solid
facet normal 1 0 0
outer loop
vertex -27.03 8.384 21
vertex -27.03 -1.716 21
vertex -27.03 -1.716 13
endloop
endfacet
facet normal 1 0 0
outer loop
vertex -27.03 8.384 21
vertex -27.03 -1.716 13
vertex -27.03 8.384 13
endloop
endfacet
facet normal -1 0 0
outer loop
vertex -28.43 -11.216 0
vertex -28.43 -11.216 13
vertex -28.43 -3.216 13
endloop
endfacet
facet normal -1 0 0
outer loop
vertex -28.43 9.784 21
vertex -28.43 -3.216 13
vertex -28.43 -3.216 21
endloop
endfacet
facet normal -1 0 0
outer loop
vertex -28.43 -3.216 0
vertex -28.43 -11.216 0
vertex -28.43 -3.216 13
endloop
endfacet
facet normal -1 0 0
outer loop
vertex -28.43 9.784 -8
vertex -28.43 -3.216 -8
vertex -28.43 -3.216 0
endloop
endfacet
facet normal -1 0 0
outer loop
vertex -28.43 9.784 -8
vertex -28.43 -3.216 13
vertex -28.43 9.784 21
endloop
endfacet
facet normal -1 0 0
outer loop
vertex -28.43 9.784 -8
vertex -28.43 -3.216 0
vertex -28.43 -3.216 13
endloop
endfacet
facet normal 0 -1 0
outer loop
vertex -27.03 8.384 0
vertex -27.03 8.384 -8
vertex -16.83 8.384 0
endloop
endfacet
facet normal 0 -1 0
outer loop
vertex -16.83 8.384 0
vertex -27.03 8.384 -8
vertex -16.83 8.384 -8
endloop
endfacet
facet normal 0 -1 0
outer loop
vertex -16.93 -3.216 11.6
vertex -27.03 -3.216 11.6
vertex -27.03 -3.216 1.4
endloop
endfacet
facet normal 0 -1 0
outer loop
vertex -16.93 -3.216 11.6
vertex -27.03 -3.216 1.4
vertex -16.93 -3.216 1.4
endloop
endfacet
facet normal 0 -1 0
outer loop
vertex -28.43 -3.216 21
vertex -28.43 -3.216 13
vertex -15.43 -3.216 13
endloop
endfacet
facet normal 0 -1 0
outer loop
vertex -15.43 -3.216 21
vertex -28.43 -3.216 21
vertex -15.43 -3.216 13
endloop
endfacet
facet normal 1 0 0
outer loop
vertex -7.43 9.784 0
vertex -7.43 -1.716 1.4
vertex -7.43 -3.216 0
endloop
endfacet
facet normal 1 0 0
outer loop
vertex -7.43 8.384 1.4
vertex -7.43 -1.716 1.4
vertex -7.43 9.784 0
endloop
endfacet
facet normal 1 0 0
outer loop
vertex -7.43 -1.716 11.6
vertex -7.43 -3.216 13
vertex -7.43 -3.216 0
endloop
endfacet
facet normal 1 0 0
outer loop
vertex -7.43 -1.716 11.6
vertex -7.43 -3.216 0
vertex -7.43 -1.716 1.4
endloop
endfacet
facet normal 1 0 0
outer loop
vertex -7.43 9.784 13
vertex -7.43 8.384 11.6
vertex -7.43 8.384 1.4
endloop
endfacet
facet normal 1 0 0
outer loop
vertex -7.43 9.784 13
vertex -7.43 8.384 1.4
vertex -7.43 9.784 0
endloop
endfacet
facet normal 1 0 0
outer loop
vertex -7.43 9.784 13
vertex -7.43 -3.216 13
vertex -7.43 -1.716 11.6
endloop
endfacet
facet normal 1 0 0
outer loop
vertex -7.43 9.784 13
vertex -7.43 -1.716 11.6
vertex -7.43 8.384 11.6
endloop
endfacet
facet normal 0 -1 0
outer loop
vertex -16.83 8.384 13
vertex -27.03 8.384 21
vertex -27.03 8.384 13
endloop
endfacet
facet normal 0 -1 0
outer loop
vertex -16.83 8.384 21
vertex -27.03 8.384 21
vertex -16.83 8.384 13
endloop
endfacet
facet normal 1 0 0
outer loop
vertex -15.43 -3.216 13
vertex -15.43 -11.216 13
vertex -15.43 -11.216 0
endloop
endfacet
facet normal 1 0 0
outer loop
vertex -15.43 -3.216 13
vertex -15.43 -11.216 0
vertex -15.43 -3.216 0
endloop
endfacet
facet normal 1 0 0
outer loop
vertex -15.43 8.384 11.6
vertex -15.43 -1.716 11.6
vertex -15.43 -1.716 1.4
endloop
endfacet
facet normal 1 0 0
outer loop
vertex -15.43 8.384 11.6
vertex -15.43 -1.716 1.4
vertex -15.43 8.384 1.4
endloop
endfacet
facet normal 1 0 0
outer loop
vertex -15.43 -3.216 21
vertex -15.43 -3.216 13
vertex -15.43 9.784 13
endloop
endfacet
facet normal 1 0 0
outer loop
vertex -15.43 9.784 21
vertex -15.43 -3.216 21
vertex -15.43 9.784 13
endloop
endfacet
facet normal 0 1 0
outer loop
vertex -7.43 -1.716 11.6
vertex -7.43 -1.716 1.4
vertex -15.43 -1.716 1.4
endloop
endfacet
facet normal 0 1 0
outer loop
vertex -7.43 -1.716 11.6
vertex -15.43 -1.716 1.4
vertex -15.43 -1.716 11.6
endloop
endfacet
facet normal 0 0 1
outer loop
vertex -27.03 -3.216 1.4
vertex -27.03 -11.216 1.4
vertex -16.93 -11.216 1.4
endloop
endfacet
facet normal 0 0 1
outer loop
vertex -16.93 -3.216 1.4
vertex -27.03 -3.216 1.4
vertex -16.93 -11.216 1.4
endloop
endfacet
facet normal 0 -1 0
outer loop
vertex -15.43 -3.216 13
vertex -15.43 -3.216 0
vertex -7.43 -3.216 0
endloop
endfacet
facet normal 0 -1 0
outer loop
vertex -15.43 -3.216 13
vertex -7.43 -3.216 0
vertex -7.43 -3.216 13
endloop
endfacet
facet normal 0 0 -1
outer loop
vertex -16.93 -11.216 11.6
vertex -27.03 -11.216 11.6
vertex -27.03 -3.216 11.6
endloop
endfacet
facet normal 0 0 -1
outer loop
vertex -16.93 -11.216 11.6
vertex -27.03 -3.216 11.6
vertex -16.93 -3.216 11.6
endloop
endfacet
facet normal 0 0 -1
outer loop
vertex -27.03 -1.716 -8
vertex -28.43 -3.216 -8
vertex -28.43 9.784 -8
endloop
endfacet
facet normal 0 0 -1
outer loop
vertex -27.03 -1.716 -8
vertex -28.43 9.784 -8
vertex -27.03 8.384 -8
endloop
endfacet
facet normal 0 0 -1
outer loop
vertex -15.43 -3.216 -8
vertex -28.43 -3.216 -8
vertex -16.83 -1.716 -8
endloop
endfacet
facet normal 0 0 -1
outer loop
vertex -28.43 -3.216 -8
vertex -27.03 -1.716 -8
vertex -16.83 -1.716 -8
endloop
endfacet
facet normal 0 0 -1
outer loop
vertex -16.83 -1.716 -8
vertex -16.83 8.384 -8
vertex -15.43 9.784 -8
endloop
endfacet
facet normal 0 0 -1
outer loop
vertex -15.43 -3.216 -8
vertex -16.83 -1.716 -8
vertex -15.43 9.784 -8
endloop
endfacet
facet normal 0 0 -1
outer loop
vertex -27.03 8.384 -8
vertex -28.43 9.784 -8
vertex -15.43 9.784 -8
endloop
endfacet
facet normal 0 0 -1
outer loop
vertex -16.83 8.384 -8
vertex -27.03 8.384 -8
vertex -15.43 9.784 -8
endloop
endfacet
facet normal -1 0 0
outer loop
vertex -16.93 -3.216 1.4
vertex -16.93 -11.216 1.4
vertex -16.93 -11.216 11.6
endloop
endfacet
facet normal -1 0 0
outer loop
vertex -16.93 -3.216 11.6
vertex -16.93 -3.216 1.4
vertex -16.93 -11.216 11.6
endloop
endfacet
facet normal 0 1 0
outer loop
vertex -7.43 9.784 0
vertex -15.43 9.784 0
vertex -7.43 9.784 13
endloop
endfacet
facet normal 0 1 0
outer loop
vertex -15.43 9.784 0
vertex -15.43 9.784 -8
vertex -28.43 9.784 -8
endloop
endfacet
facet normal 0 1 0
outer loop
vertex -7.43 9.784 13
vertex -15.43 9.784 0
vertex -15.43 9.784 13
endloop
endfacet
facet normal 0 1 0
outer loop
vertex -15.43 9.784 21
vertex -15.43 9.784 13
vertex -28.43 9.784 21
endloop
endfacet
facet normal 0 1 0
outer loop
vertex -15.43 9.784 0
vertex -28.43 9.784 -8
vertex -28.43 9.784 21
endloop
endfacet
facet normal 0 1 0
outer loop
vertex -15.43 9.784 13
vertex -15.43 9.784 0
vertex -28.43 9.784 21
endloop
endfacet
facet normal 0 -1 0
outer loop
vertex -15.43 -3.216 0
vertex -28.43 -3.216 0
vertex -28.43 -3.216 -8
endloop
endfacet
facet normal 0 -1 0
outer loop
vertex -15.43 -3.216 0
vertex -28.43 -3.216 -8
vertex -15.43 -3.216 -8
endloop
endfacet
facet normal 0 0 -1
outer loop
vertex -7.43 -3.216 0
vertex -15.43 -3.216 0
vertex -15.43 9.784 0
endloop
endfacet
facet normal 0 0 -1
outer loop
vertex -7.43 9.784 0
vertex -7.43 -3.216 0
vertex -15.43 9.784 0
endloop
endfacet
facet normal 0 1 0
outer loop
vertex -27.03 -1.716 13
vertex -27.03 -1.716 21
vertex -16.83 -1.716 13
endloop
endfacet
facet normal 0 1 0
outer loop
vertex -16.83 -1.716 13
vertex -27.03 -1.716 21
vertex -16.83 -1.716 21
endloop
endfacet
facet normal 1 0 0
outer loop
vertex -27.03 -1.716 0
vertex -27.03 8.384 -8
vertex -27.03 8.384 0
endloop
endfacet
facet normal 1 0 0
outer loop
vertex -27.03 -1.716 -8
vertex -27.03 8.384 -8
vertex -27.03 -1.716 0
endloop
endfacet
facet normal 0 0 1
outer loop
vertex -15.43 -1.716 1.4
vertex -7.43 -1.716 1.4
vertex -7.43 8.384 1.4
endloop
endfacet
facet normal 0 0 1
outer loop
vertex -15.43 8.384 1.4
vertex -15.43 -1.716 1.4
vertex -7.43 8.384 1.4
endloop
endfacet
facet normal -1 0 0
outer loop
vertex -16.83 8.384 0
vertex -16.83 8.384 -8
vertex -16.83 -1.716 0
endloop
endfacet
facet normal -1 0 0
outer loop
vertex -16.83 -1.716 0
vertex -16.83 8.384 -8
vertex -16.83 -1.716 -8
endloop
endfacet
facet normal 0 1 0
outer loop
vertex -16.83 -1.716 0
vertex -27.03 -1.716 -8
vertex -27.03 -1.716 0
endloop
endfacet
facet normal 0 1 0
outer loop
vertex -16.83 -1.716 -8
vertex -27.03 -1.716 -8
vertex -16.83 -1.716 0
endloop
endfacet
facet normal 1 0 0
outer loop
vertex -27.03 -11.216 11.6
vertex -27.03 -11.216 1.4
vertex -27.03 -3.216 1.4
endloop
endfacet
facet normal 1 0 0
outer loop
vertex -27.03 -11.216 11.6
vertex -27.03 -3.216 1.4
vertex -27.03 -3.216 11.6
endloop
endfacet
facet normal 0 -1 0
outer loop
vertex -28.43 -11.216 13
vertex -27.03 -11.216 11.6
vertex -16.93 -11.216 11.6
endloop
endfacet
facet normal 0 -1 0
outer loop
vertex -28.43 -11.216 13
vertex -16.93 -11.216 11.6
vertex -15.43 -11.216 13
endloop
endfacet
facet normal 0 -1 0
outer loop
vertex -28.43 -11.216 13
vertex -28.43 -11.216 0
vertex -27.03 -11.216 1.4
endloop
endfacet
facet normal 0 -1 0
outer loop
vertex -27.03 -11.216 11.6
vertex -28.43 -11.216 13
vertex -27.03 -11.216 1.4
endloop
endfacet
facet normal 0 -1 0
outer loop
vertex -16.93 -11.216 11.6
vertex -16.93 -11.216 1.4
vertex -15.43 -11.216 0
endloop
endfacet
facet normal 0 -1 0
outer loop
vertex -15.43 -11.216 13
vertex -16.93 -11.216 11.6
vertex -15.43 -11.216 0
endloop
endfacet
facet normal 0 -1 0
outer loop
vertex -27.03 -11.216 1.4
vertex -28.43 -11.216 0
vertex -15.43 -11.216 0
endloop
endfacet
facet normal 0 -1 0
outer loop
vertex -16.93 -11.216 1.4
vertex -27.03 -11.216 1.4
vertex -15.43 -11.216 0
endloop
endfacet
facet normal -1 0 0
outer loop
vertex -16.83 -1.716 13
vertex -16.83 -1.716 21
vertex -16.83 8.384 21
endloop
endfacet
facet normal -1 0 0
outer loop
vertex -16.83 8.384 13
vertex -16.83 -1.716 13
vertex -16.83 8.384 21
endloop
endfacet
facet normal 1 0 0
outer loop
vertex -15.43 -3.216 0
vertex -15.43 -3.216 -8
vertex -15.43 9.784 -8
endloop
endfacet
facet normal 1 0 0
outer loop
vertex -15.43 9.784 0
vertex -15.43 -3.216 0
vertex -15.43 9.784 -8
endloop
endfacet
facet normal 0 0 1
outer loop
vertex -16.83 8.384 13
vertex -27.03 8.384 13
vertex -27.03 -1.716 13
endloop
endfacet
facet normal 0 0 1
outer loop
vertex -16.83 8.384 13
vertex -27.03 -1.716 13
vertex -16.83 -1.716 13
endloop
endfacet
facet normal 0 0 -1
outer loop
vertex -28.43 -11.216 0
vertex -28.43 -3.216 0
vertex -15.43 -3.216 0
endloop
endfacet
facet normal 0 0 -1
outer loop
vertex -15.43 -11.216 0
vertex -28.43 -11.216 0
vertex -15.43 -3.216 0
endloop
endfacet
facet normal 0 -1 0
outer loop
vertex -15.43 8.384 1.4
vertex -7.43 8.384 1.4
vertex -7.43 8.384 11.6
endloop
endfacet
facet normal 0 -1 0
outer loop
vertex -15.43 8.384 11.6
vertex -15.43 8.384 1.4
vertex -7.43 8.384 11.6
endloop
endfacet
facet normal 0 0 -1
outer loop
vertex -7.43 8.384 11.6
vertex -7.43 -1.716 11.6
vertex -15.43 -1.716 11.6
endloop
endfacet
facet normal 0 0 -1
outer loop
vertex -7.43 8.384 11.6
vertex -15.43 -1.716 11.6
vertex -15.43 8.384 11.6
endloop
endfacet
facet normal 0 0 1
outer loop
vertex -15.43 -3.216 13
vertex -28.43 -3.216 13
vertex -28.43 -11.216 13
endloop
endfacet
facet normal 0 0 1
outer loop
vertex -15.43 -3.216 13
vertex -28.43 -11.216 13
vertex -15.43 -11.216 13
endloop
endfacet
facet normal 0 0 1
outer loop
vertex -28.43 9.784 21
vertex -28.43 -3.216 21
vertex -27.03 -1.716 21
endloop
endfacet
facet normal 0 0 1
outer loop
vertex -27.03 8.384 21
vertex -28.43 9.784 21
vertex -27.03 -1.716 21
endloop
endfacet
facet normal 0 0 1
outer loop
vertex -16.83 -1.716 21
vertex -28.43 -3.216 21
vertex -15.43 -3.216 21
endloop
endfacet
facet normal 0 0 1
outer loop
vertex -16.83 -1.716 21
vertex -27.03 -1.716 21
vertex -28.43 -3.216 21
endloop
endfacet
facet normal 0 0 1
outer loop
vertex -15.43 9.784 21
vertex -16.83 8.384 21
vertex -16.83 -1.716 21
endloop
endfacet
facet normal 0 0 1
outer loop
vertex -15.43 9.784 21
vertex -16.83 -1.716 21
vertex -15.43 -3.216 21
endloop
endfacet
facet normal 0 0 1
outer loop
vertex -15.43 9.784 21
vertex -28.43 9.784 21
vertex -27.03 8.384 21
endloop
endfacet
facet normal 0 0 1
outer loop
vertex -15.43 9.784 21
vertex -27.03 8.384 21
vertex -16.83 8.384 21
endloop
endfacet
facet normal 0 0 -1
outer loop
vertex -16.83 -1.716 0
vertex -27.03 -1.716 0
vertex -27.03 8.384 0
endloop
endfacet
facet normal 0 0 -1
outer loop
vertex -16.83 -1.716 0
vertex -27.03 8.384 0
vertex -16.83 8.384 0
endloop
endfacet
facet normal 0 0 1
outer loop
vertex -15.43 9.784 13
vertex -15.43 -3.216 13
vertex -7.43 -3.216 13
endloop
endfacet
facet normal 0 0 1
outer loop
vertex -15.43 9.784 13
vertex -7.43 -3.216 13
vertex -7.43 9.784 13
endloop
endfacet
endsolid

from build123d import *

# Parameters (mm, degrees)
F0_W          = 13
F0_H          = 21
F1_DEPTH      = 13
F3_W          = 13
F3_H          = 13
F4_DEPTH      = 8
F4_DEPTH_BACK = 21
F5_W          = 10.2
F5_H          = 10.1
F6_DEPTH      = 8
F7_W          = 10.2
F7_H          = 10.1
F8_DEPTH      = 8
F9_W          = 13
F9_H          = 13
F10_DEPTH     = 8
F2_W          = 10.1
F2_H          = 10.2
F12_DEPTH     = 8
F11_W         = 10.1
F11_H         = 10.2
F13_DEPTH     = 8


with BuildPart() as f1:
    # F0 (on Top) → F1 (new body)
    with BuildSketch(Plane.XY):
        with Locations((-21.92968, -0.716216)):
            Rectangle(F0_W, F0_H)
    extrude(amount=F1_DEPTH)

    # F3 (on face) → F4 (join, two sides)
    with BuildSketch(Plane.XY.offset(13)) as f4_sk:
        with Locations((-21.92968, 3.283784)):
            Rectangle(F3_W, F3_H)
    extrude(amount=F4_DEPTH)
    extrude(f4_sk.sketch, amount=-F4_DEPTH_BACK)

    # F5 (on face) → F6 (cut)
    with BuildSketch(Plane.XY.offset(21)):
        with Locations((-21.92968, 3.333784)):
            Rectangle(F5_W, F5_H)
    extrude(amount=-F6_DEPTH, mode=Mode.SUBTRACT)

    # F7 (on face) → F8 (cut)
    with BuildSketch(Plane(origin=(0, 0, -8), x_dir=(1, 0, 0), z_dir=(0, 0, -1))):
        with Locations((-21.92968, -3.333784)):
            Rectangle(F7_W, F7_H)
    extrude(amount=-F8_DEPTH, mode=Mode.SUBTRACT)

    # F9 (on face) → F10 (join)
    with BuildSketch(Plane.YZ.offset(-15.42968)):
        with Locations((3.283784, 6.5)):
            Rectangle(F9_W, F9_H)
    extrude(amount=F10_DEPTH)

    # F2 (on face) → F12 (cut)
    with BuildSketch(Plane.XZ.offset(11.216216)):
        with Locations((-21.97968, 6.5)):
            Rectangle(F2_W, F2_H)
    extrude(amount=-F12_DEPTH, mode=Mode.SUBTRACT)

    # F11 (on face) → F13 (cut)
    with BuildSketch(Plane.YZ.offset(-7.42968)):
        with Locations((3.333784, 6.5)):
            Rectangle(F11_W, F11_H)
    extrude(amount=-F13_DEPTH, mode=Mode.SUBTRACT)


solid = f1.part
